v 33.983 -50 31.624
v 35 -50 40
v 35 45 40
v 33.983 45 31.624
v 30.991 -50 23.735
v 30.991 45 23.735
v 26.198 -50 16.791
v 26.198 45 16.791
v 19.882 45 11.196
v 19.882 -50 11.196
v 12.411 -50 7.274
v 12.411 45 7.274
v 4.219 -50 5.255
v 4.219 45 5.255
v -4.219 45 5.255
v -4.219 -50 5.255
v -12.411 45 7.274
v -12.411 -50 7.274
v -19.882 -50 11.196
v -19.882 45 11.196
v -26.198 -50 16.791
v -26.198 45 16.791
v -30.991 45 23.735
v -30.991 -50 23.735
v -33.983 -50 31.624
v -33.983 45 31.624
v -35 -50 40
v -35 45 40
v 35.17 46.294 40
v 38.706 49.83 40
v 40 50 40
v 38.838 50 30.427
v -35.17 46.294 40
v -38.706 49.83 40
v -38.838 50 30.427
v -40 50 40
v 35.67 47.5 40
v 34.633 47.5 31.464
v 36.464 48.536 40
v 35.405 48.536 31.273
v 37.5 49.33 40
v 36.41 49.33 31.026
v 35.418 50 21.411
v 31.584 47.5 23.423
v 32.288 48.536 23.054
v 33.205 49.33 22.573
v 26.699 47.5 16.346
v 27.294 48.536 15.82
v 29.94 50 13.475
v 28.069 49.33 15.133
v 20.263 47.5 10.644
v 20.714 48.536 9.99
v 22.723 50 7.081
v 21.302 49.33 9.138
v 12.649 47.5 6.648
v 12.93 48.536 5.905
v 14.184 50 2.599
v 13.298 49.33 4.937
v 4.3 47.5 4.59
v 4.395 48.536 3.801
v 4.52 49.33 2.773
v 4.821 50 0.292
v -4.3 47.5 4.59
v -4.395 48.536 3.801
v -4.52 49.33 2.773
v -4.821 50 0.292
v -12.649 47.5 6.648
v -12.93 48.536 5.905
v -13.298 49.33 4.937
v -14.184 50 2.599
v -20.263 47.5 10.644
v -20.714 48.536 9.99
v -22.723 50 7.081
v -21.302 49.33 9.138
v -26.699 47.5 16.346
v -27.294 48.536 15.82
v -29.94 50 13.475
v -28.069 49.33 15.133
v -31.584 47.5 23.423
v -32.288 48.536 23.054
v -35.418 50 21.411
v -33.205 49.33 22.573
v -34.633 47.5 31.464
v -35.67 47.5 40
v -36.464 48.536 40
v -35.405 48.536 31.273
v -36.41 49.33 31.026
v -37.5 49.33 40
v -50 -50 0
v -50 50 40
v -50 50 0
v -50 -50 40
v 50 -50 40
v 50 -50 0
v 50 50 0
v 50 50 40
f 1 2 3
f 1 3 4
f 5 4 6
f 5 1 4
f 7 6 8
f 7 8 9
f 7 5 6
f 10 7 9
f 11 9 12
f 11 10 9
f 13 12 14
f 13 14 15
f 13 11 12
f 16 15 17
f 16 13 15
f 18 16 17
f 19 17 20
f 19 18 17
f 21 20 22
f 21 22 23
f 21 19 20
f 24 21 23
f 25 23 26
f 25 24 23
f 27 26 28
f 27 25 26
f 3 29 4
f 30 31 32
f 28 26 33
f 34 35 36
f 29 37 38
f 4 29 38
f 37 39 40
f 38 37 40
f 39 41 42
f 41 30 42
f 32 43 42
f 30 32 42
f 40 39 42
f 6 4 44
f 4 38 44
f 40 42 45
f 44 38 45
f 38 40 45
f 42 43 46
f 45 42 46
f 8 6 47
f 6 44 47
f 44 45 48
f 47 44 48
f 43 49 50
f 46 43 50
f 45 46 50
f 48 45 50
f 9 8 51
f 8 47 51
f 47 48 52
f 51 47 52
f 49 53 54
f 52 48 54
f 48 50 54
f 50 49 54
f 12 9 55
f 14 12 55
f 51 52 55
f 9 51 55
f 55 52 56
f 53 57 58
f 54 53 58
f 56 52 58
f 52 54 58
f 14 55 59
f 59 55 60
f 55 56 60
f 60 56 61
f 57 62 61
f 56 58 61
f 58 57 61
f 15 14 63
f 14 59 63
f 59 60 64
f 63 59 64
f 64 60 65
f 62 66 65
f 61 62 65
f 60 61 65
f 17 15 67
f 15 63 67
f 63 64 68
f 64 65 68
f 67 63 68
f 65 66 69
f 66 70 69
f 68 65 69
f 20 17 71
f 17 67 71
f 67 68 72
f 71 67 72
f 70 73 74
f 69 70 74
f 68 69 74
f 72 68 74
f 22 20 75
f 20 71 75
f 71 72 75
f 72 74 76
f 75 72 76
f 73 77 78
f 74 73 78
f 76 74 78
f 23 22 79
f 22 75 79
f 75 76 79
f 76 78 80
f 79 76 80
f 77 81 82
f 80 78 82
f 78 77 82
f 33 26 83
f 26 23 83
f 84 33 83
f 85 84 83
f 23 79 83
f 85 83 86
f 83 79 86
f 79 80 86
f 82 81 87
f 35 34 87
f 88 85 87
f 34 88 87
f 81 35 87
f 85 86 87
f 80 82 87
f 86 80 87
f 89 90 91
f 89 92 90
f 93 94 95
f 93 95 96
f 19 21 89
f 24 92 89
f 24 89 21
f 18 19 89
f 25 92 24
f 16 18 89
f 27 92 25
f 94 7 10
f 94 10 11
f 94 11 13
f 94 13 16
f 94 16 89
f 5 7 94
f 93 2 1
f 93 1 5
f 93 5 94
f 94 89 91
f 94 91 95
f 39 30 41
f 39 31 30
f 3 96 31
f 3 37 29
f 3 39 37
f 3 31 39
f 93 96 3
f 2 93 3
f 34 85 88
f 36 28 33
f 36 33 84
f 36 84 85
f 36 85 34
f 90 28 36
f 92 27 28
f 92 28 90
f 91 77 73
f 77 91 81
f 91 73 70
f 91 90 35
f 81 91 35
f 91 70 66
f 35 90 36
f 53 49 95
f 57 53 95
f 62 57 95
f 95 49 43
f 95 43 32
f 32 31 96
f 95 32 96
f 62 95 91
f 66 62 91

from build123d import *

# Parameters (mm, degrees)
F1_DEPTH = 50
F2_R     = 4.99999


# Not quite as in the source:
# - a fillet or chamfer is up to 0.001 mm smaller than in the source, because OpenCascade refuses the exact size


with BuildPart() as f1:
    # F0 (on Front) → F1 (new body, symmetric)
    with BuildSketch(Plane.XZ):
        with BuildLine():
            Line((-50, 40), (-50, 0))
            Line((-50, 0), (0, 0))
            Line((0, 0), (50, 0))
            Line((50, 0), (50, 40))
            Line((50, 40), (35, 40))
            ThreePointArc((35, 40), (0, 5), (-35, 40))
            Line((-35, 40), (-50, 40))
        make_face()
    extrude(amount=F1_DEPTH, both=True)

    # F2 (radius 5 in the source; OpenCascade refuses exactly that, so slightly less here)
    f2_edges = [f1.edges().sort_by_distance(p)[0] for p in [
        (0, 50, 5),
    ]]
    fillet(f2_edges, radius=F2_R)


solid = f1.part
